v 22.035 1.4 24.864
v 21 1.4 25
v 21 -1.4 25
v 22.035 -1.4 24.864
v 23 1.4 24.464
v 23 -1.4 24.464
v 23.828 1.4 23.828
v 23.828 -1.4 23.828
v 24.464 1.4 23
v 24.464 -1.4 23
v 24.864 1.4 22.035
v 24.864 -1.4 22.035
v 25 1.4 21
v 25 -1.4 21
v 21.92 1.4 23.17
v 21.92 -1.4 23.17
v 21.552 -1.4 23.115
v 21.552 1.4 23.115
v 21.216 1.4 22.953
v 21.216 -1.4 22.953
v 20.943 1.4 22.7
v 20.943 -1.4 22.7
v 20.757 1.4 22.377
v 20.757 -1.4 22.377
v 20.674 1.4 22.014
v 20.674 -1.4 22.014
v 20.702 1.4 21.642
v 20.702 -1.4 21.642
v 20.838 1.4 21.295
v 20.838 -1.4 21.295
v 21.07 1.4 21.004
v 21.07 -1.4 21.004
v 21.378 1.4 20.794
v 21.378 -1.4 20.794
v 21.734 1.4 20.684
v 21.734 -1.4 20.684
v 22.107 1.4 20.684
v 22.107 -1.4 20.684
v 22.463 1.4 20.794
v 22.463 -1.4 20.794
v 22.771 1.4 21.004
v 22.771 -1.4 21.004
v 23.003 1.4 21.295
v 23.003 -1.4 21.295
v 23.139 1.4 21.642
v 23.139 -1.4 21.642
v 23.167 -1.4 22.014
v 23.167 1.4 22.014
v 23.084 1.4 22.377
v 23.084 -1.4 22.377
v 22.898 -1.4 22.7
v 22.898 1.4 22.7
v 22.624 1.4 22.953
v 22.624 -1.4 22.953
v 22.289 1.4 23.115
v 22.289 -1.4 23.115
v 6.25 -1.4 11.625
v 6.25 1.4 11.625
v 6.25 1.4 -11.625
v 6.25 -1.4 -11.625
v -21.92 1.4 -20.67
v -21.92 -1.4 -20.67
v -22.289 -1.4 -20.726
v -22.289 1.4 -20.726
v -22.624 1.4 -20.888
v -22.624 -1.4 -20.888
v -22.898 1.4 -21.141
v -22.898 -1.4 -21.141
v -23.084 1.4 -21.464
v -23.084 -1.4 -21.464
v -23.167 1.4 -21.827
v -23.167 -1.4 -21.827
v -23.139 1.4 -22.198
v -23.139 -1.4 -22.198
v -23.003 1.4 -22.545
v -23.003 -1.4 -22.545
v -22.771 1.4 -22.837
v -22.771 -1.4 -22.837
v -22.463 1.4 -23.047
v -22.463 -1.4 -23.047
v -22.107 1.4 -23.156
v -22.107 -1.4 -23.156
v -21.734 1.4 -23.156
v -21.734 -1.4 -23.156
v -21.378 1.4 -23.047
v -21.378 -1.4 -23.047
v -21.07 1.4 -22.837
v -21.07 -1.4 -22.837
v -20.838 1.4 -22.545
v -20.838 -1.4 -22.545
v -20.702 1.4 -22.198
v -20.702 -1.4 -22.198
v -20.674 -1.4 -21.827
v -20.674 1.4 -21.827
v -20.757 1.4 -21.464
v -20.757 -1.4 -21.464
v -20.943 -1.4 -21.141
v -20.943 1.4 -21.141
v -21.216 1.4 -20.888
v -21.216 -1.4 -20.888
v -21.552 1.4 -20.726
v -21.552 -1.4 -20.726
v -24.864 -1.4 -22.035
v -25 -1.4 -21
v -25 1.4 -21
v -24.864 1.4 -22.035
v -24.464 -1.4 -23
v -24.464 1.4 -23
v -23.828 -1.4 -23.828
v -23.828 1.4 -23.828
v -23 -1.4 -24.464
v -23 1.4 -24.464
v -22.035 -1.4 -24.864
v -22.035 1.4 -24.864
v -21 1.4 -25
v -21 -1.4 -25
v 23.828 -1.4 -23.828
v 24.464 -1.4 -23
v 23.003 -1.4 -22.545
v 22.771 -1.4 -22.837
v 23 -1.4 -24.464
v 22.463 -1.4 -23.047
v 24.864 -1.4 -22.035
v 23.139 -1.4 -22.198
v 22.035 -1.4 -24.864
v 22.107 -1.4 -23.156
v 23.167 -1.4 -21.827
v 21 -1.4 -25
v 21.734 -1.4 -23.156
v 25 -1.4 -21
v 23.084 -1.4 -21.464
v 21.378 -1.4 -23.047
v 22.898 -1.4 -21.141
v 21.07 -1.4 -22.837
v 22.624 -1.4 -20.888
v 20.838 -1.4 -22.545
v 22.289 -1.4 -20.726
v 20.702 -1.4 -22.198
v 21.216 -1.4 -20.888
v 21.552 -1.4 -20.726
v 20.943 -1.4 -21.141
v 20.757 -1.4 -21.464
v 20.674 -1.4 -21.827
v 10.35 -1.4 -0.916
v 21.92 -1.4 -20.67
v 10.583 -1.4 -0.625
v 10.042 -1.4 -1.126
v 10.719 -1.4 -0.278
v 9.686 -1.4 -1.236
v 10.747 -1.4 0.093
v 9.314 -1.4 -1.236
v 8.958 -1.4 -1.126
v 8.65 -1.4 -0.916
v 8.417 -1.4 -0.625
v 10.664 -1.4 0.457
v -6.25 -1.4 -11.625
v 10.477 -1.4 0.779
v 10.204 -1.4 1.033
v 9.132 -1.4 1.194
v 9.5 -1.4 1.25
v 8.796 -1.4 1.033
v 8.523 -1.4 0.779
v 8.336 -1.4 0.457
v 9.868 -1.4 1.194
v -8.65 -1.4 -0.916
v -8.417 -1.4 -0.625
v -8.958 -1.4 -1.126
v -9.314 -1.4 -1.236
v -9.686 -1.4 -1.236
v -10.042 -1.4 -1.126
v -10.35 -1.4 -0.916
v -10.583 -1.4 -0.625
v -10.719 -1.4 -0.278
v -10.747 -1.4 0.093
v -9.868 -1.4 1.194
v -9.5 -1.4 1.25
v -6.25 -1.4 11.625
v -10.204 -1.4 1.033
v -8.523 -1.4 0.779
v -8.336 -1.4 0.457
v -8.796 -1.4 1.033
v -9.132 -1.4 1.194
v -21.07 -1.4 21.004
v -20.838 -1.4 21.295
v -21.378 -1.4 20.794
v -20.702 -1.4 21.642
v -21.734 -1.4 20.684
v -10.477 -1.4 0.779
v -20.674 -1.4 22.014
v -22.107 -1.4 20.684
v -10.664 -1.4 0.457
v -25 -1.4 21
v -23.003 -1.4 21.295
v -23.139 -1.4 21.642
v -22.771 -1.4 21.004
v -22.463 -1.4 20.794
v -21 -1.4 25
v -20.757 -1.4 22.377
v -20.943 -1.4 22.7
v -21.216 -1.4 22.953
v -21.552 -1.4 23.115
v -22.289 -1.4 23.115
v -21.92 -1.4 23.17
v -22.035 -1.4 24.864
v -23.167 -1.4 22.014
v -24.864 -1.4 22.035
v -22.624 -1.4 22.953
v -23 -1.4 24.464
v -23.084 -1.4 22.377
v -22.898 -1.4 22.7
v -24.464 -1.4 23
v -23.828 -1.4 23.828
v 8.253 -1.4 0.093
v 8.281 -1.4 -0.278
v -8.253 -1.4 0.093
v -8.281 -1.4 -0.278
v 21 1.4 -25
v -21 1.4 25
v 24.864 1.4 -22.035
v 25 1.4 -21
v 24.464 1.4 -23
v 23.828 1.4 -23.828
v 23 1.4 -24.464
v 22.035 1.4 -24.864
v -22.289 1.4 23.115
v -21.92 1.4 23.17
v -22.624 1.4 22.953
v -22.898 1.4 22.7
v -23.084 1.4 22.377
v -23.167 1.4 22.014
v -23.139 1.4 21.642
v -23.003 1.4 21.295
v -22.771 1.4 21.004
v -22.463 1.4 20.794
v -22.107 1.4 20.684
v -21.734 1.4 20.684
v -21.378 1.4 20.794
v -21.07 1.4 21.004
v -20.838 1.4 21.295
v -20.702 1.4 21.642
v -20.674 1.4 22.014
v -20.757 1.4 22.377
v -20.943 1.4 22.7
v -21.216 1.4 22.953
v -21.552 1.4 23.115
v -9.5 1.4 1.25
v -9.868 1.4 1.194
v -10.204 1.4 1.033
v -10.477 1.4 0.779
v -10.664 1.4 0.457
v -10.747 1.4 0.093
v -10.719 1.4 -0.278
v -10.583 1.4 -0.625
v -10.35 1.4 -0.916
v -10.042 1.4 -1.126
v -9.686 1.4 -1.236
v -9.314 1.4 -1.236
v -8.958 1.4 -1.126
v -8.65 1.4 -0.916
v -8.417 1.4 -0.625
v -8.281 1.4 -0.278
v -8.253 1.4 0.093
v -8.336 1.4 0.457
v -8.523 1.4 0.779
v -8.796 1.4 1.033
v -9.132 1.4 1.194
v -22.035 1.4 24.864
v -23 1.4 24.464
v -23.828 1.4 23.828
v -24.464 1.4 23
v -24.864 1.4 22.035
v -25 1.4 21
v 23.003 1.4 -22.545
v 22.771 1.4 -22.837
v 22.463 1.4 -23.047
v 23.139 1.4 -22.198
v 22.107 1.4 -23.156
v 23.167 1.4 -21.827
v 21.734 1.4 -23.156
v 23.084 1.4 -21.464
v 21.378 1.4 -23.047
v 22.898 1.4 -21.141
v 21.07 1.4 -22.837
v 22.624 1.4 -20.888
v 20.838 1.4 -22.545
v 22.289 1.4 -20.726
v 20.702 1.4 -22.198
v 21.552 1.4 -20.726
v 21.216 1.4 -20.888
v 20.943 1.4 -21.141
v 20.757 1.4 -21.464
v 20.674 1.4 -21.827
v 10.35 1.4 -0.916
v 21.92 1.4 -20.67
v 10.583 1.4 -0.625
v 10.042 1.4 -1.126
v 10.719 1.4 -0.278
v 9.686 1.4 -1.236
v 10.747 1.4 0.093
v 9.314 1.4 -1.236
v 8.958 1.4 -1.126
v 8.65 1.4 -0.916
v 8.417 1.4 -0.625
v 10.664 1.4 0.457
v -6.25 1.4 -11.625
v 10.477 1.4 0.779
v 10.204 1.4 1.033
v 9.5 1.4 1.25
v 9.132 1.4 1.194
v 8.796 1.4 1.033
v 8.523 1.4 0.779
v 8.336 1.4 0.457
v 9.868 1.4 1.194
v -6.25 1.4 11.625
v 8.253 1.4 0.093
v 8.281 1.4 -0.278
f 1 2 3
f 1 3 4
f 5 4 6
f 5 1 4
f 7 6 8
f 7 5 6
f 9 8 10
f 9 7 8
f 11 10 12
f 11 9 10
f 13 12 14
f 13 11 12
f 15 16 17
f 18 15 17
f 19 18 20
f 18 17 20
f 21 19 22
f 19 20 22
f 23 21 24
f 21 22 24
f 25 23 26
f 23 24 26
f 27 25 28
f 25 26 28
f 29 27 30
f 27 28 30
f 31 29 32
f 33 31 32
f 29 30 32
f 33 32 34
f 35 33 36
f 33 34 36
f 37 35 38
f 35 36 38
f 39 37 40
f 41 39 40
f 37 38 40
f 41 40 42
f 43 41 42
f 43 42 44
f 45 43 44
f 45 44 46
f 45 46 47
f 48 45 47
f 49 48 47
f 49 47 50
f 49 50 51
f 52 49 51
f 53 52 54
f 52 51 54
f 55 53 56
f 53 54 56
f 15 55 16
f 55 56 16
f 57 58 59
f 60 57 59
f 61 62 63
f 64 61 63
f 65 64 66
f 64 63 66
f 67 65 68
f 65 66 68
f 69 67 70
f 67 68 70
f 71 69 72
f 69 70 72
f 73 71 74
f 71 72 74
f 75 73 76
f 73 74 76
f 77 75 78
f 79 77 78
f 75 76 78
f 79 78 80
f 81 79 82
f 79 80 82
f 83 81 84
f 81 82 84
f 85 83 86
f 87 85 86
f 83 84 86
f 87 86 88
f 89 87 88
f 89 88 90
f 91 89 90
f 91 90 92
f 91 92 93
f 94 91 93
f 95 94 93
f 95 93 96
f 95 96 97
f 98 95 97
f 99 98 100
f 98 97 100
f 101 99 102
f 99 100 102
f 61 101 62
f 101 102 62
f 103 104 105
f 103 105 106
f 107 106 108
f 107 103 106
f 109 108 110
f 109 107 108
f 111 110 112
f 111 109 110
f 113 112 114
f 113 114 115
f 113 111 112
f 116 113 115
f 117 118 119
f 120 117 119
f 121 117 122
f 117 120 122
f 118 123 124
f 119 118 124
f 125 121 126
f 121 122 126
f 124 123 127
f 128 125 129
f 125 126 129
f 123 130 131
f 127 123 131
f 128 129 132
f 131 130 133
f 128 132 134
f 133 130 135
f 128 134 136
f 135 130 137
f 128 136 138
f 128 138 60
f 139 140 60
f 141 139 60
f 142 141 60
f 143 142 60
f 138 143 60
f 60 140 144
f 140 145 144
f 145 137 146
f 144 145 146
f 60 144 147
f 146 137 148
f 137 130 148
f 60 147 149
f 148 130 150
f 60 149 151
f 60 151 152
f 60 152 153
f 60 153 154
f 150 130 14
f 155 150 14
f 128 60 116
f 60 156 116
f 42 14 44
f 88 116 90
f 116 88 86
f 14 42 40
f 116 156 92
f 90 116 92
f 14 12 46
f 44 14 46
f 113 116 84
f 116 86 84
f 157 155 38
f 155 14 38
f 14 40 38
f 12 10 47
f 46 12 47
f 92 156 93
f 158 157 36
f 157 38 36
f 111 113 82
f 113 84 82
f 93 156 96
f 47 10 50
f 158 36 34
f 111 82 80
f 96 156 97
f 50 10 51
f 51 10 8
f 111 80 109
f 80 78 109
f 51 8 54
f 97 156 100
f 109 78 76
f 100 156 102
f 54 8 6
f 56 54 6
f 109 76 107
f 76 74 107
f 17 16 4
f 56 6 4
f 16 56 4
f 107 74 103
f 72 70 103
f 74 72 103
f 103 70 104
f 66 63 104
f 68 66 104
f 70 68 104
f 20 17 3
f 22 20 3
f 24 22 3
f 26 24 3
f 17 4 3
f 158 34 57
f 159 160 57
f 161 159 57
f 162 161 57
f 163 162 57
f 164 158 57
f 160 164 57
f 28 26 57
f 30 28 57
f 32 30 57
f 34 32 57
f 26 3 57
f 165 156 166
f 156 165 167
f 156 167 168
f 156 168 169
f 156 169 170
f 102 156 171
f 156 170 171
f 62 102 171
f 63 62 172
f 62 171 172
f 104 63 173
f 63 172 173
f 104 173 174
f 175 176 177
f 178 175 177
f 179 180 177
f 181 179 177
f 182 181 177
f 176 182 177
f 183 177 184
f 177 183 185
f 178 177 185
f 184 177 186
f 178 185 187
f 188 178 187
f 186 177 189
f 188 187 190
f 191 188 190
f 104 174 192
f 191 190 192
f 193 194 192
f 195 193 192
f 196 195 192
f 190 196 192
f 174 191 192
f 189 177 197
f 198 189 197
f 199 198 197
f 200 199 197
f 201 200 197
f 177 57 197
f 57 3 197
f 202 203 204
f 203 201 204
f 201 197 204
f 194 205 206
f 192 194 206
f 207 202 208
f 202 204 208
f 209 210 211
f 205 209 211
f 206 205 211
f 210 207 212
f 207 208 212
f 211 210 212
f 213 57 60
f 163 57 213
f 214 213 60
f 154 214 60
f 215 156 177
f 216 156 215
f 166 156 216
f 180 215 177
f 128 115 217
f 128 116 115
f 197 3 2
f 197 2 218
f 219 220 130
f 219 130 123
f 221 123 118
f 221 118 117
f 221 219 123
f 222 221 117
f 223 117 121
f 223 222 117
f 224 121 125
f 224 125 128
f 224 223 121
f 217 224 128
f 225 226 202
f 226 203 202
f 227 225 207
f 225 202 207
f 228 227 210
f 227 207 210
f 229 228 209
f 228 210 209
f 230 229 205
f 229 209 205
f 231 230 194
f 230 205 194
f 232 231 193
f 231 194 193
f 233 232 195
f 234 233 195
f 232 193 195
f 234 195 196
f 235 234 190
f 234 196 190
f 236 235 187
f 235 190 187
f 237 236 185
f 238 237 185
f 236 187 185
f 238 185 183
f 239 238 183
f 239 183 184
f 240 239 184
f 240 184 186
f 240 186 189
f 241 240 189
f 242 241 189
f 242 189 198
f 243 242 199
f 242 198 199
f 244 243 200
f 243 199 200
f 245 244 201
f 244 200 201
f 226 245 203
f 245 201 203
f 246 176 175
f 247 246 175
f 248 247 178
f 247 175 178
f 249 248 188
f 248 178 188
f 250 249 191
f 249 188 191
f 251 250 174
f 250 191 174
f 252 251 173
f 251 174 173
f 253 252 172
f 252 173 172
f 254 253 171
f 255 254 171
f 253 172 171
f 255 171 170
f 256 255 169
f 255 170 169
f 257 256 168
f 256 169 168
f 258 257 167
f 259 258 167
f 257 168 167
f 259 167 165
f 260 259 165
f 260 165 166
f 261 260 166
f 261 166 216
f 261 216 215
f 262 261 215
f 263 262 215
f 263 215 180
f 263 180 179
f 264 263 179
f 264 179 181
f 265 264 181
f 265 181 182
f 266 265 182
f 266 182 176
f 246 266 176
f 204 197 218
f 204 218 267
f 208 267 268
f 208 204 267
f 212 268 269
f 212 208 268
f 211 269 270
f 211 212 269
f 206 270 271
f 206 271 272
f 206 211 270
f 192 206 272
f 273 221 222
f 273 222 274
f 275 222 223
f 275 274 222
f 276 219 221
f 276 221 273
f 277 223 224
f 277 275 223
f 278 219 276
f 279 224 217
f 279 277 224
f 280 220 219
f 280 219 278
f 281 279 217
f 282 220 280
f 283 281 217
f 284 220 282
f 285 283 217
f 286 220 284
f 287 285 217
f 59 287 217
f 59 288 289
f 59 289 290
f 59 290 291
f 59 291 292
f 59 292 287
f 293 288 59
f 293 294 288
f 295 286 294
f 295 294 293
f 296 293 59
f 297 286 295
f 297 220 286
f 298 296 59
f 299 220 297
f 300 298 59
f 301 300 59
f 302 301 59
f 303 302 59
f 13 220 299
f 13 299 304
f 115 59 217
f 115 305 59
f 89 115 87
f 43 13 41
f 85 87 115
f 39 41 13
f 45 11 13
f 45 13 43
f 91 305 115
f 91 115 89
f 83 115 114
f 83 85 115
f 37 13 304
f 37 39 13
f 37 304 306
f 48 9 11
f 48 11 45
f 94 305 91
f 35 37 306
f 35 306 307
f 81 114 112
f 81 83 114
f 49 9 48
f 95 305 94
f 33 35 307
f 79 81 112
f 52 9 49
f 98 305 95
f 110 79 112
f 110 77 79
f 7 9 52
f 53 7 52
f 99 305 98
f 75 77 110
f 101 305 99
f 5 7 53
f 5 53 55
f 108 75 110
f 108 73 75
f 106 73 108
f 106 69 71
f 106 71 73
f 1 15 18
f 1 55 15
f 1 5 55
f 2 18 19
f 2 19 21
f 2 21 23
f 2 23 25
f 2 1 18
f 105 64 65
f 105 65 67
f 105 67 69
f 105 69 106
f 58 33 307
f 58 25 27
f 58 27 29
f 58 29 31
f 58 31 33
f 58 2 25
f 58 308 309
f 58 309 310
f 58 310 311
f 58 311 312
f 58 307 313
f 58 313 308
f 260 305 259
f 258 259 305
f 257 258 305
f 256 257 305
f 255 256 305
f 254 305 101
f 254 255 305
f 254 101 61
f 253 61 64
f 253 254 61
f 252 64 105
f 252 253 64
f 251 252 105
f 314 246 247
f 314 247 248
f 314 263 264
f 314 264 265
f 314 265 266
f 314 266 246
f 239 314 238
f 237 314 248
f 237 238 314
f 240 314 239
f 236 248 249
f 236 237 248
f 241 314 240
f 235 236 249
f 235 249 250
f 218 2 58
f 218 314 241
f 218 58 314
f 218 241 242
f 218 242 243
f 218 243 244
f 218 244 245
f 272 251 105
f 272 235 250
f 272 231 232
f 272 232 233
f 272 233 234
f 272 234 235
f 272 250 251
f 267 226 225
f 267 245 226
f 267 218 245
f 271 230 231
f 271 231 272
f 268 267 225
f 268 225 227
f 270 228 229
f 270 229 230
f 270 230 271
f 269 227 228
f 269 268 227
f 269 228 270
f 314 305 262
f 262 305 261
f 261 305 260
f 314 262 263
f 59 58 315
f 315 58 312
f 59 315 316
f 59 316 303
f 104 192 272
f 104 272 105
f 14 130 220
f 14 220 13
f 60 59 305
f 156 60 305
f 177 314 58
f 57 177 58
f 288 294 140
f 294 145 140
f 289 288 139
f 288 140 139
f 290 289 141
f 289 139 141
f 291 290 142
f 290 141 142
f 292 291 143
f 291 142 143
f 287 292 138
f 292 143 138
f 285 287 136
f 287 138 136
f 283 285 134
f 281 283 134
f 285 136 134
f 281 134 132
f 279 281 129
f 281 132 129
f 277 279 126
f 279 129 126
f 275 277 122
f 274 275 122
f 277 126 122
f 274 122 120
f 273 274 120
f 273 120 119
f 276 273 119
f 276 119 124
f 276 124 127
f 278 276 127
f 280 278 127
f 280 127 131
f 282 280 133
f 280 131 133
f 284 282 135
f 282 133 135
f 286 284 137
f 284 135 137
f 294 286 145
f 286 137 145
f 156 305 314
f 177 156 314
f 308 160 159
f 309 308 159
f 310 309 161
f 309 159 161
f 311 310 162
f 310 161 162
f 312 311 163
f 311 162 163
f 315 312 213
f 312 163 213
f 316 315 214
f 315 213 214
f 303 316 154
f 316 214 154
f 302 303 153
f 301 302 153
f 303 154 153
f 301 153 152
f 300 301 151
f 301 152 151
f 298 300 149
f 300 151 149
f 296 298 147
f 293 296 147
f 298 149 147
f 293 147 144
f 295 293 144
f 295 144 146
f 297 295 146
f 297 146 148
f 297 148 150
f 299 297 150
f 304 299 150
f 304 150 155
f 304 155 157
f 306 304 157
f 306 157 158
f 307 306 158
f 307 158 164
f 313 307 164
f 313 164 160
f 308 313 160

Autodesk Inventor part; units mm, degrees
ref_plane "YZ Plane" through (0, 0, 0) normal (1, 0, 0) x (0, 1, 0)
ref_plane "XZ Plane" through (0, 0, 0) normal (0, 1, 0) x (-1, 0, 0)
ref_plane "XY Plane" through (0, 0, 0) normal (0, 0, 1) x (1, 0, 0)
sketch "Sketch1" plane through (0, 0, 0) normal (0, 1, 0) x (-1, 0, 0)
  line L0 (-25, 25) -> (25, 25)
  line L1 (25, 25) -> (25, -25)
  line L2 (25, -25) -> (-25, -25)
  line L3 (-25, -25) -> (-25, 25)
  line L4 (-25, 25) -> (25, -25) construction
  line L5 (25, 25) -> (-25, -25) construction
  point P0 (0, 0)
  dimension "d0" = 50
extrude "Extrusion1" add sketch "Sketch1" along normal mid plane 2.8
sketch "Sketch2" plane through (0, 1.4, 0) normal (0, 1, 0) x (1, 0, 0)
  line L0 (-6.25, -11.625) -> (6.25, -11.625)
  line L1 (6.25, -11.625) -> (6.25, 11.625)
  line L2 (6.25, 11.625) -> (-6.25, 11.625)
  line L3 (-6.25, 11.625) -> (-6.25, -11.625)
  line L4 (-6.25, -11.625) -> (6.25, 11.625) construction
  line L5 (6.25, -11.625) -> (-6.25, 11.625) construction
  point P0 (0, 0)
  dimension "d3" = 12.5
  dimension "d4" = 23.25
extrude "Extrusion2" cut sketch "Sketch2" against normal through all
sketch "Sketch3" plane through (0, 1.4, 0) normal (0, 1, 0) x (1, 0, 0)
  line L0 (6.25, 11.625) -> (6.25, -11.625) construction
  line L1 (6.25, -11.625) -> (-6.25, -11.625) construction
  line L2 (-6.25, -11.625) -> (-6.25, 11.625) construction
  line L3 (-6.25, 11.625) -> (6.25, 11.625) construction
  line L4 (-25, -25) -> (25, -25) construction
  line L5 (25, -25) -> (25, 25) construction
  line L6 (25, 25) -> (-25, 25) construction
  line L7 (-25, 25) -> (-25, -25) construction
  line L8 (-21.9203, 21.9203) -> (21.9203, 21.9203)
  line L9 (21.9203, 21.9203) -> (21.9203, -21.9203)
  line L10 (21.9203, -21.9203) -> (-21.9203, -21.9203)
  line L11 (-21.9203, -21.9203) -> (-21.9203, 21.9203)
  line L12 (-9.5, 14.875) -> (-9.5, -14.875)
  line L13 (-9.5, -14.875) -> (9.5, -14.875)
  line L14 (9.5, -14.875) -> (9.5, 14.875)
  line L15 (9.5, 14.875) -> (-9.5, 14.875)
  point P0 (0, 0)
  point P1 (-9.5, 0)
  point P2 (9.5, 0)
  dimension "d7" = 62
  dimension "d8" = 19
hole "Hole1" at (-21.9203, 1.4, -21.9203) at (21.9203, 1.4, -21.9203) at (21.9203, 1.4, 21.9203) at (-21.9203, 1.4, 21.9203) at (-9.5, 1.4, 0) at (9.5, 1.4, 0) direction (0, -1, 0) diameter 2.5 end through all
fillet "Fillet1" radius 4 4 edges at (-25, 0, -25) (25, 0, -25) (25, 0, 25) (-25, 0, 25)
